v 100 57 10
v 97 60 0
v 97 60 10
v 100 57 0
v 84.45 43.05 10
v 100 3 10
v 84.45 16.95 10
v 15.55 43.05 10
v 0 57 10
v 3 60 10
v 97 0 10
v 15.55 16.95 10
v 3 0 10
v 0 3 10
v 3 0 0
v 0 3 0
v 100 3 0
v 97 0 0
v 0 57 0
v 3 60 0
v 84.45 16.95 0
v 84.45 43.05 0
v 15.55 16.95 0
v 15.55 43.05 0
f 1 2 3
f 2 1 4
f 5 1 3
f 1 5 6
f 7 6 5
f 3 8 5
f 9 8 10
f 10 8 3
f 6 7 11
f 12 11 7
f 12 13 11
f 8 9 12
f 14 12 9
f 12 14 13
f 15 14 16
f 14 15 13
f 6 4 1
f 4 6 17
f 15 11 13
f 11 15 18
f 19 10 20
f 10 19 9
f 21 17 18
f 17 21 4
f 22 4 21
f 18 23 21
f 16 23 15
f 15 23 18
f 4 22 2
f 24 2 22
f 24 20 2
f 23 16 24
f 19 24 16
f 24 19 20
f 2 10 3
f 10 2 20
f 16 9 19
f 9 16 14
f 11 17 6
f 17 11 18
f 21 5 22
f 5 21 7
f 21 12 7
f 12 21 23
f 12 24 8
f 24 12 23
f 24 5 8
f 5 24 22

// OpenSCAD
$fn = 32;

// ----------------------------------------------------------------------
// Windowed plate: 1 voids, 100 x 60 x 10 mm
// ----------------------------------------------------------------------

// --- parameters (mm) ---
plate_l = 100;            // plate length, X
plate_w = 60;             // plate width, Y
plate_t = 10;             // plate thickness, Z
edge_margin = 12;         // wall from the plate edge to any window
win1_l = 68.9;            // window length
win1_w = 26.1;            // window width
depth_1 = 10;             // depth of void 1 (full thickness = through)
corner_c = 3;             // corner chamfer of the plate

profile = [[3, 0], [97, 0], [100, 3], [100, 57], [97, 60], [3, 60], [0, 57], [0, 3]];  // primary outline, 8 points, counter clockwise
void_1 = [[15.55, 16.95], [84.45, 16.95], [84.45, 43.05], [15.55, 43.05]];  // large central window, 4 points

// --- the one profile operation ---
difference() {
  linear_extrude(height = plate_t) polygon(points = profile);
  translate([0, 0, -1])
    linear_extrude(height = plate_t + 2) polygon(points = void_1);
}
